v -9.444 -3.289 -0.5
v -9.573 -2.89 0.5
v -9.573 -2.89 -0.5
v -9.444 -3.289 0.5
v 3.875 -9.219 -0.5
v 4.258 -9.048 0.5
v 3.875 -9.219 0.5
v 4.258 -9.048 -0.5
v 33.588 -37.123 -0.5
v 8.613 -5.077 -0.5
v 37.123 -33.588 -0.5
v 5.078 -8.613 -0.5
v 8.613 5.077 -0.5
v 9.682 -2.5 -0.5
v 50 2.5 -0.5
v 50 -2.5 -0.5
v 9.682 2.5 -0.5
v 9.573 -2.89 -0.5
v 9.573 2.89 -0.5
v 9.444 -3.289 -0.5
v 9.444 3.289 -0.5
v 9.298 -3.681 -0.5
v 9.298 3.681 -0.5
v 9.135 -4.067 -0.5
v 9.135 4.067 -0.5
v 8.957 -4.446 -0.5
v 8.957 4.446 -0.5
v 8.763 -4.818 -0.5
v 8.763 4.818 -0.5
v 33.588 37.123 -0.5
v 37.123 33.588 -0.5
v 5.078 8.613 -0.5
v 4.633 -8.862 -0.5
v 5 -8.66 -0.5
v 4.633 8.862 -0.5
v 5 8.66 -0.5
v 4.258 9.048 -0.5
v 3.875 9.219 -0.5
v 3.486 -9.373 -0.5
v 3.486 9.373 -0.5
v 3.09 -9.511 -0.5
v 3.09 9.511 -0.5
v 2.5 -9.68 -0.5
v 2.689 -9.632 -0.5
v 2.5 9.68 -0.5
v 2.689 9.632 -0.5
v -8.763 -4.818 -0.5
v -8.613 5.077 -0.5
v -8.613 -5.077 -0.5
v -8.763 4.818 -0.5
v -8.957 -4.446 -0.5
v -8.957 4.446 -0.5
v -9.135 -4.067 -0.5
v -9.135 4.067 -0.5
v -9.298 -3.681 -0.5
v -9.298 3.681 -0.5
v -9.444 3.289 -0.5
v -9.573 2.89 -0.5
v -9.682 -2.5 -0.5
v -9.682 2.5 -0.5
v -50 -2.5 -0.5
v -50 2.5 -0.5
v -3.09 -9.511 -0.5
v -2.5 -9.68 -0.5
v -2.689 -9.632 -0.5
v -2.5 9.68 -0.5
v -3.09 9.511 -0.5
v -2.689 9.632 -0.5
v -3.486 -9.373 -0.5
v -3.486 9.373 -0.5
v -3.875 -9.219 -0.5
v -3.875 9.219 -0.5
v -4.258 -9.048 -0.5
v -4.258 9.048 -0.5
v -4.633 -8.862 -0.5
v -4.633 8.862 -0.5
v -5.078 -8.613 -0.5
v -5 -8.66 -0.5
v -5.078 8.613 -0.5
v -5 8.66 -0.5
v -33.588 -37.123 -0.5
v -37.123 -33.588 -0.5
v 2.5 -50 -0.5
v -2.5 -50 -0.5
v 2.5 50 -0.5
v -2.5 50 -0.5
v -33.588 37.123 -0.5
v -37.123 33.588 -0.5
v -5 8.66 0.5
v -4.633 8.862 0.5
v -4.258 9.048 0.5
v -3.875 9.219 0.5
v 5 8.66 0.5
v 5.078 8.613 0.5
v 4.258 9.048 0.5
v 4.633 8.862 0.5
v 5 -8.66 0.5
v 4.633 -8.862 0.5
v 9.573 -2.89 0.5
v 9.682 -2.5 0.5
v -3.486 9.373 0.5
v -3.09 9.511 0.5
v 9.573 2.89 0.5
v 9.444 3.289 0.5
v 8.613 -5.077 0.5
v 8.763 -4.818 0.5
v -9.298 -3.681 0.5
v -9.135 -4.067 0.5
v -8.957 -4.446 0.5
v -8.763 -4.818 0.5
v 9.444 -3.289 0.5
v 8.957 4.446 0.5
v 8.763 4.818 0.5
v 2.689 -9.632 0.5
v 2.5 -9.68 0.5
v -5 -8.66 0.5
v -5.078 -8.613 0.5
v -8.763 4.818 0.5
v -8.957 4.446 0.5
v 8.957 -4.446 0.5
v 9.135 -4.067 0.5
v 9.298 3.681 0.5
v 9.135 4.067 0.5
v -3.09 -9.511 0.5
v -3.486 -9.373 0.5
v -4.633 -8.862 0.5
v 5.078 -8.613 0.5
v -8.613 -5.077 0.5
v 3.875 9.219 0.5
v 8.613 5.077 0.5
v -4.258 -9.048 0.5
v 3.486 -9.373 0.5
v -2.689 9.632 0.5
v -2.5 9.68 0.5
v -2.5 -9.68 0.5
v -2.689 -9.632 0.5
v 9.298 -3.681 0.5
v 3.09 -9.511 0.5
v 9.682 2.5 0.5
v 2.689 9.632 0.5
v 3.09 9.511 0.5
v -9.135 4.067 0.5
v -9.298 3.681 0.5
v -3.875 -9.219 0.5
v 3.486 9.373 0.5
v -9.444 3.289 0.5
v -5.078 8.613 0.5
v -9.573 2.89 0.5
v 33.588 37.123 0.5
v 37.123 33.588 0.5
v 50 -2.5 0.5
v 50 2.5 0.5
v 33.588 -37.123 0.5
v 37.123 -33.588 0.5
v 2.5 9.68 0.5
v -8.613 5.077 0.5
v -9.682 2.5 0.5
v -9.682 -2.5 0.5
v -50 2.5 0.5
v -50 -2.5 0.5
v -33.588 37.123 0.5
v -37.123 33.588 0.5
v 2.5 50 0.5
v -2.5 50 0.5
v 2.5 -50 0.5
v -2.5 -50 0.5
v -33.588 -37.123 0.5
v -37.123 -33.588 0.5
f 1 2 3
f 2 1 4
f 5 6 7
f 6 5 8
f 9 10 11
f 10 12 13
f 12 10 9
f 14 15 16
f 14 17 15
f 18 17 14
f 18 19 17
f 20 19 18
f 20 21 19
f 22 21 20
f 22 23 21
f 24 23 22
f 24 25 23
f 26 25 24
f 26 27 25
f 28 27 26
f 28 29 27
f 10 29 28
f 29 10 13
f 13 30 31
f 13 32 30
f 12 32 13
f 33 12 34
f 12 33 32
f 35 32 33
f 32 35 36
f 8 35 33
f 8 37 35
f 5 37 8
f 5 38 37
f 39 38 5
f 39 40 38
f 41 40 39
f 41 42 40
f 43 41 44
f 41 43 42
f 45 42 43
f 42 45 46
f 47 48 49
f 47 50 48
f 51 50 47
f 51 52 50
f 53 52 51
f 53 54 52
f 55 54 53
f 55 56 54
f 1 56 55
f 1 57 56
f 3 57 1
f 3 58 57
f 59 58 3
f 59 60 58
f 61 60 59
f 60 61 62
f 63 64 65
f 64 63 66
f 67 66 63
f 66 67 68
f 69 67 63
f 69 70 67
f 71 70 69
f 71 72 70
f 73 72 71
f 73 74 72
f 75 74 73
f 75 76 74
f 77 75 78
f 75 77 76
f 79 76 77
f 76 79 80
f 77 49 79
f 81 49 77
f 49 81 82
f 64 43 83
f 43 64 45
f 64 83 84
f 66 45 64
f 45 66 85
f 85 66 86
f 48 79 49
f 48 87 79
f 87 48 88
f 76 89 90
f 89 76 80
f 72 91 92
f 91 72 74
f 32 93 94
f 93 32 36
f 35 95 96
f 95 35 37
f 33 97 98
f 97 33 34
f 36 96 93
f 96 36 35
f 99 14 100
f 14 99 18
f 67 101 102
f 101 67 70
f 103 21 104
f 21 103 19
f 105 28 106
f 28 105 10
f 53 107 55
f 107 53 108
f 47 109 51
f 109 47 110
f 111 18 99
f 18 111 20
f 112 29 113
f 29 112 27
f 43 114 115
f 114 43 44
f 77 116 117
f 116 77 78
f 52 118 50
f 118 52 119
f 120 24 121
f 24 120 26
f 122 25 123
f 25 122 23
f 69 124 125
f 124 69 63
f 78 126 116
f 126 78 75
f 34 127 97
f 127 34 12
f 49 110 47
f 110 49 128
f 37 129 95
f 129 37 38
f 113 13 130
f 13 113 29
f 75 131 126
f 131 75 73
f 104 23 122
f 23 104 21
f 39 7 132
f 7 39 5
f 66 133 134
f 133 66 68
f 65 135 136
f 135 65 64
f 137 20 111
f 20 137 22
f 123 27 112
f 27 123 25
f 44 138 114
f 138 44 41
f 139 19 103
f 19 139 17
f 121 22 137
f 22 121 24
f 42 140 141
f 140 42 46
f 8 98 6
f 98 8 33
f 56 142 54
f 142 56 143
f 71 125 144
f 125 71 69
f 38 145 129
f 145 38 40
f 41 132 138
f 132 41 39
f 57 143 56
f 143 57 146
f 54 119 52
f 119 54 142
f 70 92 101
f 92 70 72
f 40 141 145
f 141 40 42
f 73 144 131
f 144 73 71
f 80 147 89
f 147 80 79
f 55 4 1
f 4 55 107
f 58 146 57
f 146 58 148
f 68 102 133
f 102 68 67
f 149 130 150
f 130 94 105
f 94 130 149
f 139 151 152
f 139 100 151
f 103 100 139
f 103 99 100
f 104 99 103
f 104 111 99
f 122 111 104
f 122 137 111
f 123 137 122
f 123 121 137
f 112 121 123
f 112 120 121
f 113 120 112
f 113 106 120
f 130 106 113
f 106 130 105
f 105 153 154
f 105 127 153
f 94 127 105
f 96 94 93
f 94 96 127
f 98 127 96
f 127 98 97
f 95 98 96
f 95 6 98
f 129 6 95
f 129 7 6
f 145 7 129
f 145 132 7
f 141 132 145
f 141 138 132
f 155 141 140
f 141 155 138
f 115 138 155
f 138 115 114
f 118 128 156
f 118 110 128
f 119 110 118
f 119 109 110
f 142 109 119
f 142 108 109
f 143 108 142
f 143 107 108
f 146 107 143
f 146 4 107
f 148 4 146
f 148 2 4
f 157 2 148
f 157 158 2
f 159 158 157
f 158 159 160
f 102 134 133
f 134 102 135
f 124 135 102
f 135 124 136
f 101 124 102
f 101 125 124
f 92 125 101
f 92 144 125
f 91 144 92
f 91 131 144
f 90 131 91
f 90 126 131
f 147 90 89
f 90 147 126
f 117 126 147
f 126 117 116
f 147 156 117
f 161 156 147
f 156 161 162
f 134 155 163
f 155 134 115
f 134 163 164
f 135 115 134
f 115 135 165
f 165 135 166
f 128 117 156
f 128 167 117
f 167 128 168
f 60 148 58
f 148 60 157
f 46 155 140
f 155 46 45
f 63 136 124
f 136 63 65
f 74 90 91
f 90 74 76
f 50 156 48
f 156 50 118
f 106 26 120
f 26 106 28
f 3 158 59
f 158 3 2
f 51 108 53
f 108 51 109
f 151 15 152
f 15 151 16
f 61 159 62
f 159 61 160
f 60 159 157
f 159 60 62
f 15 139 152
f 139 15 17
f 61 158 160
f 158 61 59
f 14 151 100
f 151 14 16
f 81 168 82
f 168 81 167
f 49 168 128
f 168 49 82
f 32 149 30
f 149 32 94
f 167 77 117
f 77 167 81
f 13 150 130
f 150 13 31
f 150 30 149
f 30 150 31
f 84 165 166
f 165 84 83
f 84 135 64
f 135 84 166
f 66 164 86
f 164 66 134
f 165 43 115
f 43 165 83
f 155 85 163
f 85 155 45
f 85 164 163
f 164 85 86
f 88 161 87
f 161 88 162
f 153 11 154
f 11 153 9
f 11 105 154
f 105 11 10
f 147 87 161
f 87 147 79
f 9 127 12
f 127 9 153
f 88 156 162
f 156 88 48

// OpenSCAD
$fn = 150;

union() {
	cylinder(center = true, d = 20.0, h = 1.0);
	cube(center = true, size = [100.0, 5.0, 1.0]);
	rotate(a = [0, 0, 45]) {
		cube(center = true, size = [100.0, 5.0, 1.0]);
	}
	rotate(a = [0, 0, 90]) {
		cube(center = true, size = [100.0, 5.0, 1.0]);
	}
	rotate(a = [0, 0, 135]) {
		cube(center = true, size = [100.0, 5.0, 1.0]);
	}
}
